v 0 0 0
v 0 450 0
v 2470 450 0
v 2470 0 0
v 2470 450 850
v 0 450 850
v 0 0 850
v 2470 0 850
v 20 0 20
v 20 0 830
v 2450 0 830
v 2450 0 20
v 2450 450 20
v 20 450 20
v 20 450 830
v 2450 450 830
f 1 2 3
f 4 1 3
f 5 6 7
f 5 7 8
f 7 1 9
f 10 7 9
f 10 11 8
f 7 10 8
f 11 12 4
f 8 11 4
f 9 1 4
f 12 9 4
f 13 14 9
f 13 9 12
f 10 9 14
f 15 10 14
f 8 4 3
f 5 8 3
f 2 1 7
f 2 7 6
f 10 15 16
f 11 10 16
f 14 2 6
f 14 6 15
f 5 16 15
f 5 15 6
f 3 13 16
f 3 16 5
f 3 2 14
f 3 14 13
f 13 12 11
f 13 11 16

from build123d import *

# Parameters (mm, degrees)
SKETCH001_W      = 20
SKETCH001_H      = 450
EXTRUDE001_DEPTH = 850
SKETCH_W         = 2430
SKETCH_H         = 450
EXTRUDE_DEPTH    = 20


with BuildPart() as lateral_esquerda:
    # Sketch001 → Extrude001 (new body)
    with BuildSketch(Plane.XY):
        with Locations((10, 225)):
            Rectangle(SKETCH001_W, SKETCH001_H)
    extrude(amount=EXTRUDE001_DEPTH)


with BuildPart() as lateral_esquerda001:
    # Clone001 base: copy of lateral esquerda
    add(lateral_esquerda.part)


with BuildPart() as lateral_esquerda001_1:
    # Clone001 placement: moved
    add(lateral_esquerda001.part.moved(Location((2450, 0, 0))))


with BuildPart() as tampo_inferior:
    # Sketch → Extrude (new body)
    with BuildSketch(Plane.XY):
        with Locations((1215, 225)):
            Rectangle(SKETCH_W, SKETCH_H)
    extrude(amount=EXTRUDE_DEPTH)


with BuildPart() as tampo_inferior_1:
    # Extrude placement: moved
    add(tampo_inferior.part.moved(Location((20, 0, 0))))


with BuildPart() as tampo:
    # Clone base: copy of Tampo inferior
    add(tampo_inferior_1.part)


with BuildPart() as tampo_1:
    # Clone placement: moved
    add(tampo.part.moved(Location((0, 0, 830))))


with BuildPart() as caixa_externa:
    # Fusion base: copy of Tampo inferior
    add(tampo_inferior_1.part)

    # Fusion: union lateral esquerda001, tampo, lateral esquerda
    add(lateral_esquerda001_1.part)
    add(tampo_1.part)
    add(lateral_esquerda.part)


solid = caixa_externa.part
